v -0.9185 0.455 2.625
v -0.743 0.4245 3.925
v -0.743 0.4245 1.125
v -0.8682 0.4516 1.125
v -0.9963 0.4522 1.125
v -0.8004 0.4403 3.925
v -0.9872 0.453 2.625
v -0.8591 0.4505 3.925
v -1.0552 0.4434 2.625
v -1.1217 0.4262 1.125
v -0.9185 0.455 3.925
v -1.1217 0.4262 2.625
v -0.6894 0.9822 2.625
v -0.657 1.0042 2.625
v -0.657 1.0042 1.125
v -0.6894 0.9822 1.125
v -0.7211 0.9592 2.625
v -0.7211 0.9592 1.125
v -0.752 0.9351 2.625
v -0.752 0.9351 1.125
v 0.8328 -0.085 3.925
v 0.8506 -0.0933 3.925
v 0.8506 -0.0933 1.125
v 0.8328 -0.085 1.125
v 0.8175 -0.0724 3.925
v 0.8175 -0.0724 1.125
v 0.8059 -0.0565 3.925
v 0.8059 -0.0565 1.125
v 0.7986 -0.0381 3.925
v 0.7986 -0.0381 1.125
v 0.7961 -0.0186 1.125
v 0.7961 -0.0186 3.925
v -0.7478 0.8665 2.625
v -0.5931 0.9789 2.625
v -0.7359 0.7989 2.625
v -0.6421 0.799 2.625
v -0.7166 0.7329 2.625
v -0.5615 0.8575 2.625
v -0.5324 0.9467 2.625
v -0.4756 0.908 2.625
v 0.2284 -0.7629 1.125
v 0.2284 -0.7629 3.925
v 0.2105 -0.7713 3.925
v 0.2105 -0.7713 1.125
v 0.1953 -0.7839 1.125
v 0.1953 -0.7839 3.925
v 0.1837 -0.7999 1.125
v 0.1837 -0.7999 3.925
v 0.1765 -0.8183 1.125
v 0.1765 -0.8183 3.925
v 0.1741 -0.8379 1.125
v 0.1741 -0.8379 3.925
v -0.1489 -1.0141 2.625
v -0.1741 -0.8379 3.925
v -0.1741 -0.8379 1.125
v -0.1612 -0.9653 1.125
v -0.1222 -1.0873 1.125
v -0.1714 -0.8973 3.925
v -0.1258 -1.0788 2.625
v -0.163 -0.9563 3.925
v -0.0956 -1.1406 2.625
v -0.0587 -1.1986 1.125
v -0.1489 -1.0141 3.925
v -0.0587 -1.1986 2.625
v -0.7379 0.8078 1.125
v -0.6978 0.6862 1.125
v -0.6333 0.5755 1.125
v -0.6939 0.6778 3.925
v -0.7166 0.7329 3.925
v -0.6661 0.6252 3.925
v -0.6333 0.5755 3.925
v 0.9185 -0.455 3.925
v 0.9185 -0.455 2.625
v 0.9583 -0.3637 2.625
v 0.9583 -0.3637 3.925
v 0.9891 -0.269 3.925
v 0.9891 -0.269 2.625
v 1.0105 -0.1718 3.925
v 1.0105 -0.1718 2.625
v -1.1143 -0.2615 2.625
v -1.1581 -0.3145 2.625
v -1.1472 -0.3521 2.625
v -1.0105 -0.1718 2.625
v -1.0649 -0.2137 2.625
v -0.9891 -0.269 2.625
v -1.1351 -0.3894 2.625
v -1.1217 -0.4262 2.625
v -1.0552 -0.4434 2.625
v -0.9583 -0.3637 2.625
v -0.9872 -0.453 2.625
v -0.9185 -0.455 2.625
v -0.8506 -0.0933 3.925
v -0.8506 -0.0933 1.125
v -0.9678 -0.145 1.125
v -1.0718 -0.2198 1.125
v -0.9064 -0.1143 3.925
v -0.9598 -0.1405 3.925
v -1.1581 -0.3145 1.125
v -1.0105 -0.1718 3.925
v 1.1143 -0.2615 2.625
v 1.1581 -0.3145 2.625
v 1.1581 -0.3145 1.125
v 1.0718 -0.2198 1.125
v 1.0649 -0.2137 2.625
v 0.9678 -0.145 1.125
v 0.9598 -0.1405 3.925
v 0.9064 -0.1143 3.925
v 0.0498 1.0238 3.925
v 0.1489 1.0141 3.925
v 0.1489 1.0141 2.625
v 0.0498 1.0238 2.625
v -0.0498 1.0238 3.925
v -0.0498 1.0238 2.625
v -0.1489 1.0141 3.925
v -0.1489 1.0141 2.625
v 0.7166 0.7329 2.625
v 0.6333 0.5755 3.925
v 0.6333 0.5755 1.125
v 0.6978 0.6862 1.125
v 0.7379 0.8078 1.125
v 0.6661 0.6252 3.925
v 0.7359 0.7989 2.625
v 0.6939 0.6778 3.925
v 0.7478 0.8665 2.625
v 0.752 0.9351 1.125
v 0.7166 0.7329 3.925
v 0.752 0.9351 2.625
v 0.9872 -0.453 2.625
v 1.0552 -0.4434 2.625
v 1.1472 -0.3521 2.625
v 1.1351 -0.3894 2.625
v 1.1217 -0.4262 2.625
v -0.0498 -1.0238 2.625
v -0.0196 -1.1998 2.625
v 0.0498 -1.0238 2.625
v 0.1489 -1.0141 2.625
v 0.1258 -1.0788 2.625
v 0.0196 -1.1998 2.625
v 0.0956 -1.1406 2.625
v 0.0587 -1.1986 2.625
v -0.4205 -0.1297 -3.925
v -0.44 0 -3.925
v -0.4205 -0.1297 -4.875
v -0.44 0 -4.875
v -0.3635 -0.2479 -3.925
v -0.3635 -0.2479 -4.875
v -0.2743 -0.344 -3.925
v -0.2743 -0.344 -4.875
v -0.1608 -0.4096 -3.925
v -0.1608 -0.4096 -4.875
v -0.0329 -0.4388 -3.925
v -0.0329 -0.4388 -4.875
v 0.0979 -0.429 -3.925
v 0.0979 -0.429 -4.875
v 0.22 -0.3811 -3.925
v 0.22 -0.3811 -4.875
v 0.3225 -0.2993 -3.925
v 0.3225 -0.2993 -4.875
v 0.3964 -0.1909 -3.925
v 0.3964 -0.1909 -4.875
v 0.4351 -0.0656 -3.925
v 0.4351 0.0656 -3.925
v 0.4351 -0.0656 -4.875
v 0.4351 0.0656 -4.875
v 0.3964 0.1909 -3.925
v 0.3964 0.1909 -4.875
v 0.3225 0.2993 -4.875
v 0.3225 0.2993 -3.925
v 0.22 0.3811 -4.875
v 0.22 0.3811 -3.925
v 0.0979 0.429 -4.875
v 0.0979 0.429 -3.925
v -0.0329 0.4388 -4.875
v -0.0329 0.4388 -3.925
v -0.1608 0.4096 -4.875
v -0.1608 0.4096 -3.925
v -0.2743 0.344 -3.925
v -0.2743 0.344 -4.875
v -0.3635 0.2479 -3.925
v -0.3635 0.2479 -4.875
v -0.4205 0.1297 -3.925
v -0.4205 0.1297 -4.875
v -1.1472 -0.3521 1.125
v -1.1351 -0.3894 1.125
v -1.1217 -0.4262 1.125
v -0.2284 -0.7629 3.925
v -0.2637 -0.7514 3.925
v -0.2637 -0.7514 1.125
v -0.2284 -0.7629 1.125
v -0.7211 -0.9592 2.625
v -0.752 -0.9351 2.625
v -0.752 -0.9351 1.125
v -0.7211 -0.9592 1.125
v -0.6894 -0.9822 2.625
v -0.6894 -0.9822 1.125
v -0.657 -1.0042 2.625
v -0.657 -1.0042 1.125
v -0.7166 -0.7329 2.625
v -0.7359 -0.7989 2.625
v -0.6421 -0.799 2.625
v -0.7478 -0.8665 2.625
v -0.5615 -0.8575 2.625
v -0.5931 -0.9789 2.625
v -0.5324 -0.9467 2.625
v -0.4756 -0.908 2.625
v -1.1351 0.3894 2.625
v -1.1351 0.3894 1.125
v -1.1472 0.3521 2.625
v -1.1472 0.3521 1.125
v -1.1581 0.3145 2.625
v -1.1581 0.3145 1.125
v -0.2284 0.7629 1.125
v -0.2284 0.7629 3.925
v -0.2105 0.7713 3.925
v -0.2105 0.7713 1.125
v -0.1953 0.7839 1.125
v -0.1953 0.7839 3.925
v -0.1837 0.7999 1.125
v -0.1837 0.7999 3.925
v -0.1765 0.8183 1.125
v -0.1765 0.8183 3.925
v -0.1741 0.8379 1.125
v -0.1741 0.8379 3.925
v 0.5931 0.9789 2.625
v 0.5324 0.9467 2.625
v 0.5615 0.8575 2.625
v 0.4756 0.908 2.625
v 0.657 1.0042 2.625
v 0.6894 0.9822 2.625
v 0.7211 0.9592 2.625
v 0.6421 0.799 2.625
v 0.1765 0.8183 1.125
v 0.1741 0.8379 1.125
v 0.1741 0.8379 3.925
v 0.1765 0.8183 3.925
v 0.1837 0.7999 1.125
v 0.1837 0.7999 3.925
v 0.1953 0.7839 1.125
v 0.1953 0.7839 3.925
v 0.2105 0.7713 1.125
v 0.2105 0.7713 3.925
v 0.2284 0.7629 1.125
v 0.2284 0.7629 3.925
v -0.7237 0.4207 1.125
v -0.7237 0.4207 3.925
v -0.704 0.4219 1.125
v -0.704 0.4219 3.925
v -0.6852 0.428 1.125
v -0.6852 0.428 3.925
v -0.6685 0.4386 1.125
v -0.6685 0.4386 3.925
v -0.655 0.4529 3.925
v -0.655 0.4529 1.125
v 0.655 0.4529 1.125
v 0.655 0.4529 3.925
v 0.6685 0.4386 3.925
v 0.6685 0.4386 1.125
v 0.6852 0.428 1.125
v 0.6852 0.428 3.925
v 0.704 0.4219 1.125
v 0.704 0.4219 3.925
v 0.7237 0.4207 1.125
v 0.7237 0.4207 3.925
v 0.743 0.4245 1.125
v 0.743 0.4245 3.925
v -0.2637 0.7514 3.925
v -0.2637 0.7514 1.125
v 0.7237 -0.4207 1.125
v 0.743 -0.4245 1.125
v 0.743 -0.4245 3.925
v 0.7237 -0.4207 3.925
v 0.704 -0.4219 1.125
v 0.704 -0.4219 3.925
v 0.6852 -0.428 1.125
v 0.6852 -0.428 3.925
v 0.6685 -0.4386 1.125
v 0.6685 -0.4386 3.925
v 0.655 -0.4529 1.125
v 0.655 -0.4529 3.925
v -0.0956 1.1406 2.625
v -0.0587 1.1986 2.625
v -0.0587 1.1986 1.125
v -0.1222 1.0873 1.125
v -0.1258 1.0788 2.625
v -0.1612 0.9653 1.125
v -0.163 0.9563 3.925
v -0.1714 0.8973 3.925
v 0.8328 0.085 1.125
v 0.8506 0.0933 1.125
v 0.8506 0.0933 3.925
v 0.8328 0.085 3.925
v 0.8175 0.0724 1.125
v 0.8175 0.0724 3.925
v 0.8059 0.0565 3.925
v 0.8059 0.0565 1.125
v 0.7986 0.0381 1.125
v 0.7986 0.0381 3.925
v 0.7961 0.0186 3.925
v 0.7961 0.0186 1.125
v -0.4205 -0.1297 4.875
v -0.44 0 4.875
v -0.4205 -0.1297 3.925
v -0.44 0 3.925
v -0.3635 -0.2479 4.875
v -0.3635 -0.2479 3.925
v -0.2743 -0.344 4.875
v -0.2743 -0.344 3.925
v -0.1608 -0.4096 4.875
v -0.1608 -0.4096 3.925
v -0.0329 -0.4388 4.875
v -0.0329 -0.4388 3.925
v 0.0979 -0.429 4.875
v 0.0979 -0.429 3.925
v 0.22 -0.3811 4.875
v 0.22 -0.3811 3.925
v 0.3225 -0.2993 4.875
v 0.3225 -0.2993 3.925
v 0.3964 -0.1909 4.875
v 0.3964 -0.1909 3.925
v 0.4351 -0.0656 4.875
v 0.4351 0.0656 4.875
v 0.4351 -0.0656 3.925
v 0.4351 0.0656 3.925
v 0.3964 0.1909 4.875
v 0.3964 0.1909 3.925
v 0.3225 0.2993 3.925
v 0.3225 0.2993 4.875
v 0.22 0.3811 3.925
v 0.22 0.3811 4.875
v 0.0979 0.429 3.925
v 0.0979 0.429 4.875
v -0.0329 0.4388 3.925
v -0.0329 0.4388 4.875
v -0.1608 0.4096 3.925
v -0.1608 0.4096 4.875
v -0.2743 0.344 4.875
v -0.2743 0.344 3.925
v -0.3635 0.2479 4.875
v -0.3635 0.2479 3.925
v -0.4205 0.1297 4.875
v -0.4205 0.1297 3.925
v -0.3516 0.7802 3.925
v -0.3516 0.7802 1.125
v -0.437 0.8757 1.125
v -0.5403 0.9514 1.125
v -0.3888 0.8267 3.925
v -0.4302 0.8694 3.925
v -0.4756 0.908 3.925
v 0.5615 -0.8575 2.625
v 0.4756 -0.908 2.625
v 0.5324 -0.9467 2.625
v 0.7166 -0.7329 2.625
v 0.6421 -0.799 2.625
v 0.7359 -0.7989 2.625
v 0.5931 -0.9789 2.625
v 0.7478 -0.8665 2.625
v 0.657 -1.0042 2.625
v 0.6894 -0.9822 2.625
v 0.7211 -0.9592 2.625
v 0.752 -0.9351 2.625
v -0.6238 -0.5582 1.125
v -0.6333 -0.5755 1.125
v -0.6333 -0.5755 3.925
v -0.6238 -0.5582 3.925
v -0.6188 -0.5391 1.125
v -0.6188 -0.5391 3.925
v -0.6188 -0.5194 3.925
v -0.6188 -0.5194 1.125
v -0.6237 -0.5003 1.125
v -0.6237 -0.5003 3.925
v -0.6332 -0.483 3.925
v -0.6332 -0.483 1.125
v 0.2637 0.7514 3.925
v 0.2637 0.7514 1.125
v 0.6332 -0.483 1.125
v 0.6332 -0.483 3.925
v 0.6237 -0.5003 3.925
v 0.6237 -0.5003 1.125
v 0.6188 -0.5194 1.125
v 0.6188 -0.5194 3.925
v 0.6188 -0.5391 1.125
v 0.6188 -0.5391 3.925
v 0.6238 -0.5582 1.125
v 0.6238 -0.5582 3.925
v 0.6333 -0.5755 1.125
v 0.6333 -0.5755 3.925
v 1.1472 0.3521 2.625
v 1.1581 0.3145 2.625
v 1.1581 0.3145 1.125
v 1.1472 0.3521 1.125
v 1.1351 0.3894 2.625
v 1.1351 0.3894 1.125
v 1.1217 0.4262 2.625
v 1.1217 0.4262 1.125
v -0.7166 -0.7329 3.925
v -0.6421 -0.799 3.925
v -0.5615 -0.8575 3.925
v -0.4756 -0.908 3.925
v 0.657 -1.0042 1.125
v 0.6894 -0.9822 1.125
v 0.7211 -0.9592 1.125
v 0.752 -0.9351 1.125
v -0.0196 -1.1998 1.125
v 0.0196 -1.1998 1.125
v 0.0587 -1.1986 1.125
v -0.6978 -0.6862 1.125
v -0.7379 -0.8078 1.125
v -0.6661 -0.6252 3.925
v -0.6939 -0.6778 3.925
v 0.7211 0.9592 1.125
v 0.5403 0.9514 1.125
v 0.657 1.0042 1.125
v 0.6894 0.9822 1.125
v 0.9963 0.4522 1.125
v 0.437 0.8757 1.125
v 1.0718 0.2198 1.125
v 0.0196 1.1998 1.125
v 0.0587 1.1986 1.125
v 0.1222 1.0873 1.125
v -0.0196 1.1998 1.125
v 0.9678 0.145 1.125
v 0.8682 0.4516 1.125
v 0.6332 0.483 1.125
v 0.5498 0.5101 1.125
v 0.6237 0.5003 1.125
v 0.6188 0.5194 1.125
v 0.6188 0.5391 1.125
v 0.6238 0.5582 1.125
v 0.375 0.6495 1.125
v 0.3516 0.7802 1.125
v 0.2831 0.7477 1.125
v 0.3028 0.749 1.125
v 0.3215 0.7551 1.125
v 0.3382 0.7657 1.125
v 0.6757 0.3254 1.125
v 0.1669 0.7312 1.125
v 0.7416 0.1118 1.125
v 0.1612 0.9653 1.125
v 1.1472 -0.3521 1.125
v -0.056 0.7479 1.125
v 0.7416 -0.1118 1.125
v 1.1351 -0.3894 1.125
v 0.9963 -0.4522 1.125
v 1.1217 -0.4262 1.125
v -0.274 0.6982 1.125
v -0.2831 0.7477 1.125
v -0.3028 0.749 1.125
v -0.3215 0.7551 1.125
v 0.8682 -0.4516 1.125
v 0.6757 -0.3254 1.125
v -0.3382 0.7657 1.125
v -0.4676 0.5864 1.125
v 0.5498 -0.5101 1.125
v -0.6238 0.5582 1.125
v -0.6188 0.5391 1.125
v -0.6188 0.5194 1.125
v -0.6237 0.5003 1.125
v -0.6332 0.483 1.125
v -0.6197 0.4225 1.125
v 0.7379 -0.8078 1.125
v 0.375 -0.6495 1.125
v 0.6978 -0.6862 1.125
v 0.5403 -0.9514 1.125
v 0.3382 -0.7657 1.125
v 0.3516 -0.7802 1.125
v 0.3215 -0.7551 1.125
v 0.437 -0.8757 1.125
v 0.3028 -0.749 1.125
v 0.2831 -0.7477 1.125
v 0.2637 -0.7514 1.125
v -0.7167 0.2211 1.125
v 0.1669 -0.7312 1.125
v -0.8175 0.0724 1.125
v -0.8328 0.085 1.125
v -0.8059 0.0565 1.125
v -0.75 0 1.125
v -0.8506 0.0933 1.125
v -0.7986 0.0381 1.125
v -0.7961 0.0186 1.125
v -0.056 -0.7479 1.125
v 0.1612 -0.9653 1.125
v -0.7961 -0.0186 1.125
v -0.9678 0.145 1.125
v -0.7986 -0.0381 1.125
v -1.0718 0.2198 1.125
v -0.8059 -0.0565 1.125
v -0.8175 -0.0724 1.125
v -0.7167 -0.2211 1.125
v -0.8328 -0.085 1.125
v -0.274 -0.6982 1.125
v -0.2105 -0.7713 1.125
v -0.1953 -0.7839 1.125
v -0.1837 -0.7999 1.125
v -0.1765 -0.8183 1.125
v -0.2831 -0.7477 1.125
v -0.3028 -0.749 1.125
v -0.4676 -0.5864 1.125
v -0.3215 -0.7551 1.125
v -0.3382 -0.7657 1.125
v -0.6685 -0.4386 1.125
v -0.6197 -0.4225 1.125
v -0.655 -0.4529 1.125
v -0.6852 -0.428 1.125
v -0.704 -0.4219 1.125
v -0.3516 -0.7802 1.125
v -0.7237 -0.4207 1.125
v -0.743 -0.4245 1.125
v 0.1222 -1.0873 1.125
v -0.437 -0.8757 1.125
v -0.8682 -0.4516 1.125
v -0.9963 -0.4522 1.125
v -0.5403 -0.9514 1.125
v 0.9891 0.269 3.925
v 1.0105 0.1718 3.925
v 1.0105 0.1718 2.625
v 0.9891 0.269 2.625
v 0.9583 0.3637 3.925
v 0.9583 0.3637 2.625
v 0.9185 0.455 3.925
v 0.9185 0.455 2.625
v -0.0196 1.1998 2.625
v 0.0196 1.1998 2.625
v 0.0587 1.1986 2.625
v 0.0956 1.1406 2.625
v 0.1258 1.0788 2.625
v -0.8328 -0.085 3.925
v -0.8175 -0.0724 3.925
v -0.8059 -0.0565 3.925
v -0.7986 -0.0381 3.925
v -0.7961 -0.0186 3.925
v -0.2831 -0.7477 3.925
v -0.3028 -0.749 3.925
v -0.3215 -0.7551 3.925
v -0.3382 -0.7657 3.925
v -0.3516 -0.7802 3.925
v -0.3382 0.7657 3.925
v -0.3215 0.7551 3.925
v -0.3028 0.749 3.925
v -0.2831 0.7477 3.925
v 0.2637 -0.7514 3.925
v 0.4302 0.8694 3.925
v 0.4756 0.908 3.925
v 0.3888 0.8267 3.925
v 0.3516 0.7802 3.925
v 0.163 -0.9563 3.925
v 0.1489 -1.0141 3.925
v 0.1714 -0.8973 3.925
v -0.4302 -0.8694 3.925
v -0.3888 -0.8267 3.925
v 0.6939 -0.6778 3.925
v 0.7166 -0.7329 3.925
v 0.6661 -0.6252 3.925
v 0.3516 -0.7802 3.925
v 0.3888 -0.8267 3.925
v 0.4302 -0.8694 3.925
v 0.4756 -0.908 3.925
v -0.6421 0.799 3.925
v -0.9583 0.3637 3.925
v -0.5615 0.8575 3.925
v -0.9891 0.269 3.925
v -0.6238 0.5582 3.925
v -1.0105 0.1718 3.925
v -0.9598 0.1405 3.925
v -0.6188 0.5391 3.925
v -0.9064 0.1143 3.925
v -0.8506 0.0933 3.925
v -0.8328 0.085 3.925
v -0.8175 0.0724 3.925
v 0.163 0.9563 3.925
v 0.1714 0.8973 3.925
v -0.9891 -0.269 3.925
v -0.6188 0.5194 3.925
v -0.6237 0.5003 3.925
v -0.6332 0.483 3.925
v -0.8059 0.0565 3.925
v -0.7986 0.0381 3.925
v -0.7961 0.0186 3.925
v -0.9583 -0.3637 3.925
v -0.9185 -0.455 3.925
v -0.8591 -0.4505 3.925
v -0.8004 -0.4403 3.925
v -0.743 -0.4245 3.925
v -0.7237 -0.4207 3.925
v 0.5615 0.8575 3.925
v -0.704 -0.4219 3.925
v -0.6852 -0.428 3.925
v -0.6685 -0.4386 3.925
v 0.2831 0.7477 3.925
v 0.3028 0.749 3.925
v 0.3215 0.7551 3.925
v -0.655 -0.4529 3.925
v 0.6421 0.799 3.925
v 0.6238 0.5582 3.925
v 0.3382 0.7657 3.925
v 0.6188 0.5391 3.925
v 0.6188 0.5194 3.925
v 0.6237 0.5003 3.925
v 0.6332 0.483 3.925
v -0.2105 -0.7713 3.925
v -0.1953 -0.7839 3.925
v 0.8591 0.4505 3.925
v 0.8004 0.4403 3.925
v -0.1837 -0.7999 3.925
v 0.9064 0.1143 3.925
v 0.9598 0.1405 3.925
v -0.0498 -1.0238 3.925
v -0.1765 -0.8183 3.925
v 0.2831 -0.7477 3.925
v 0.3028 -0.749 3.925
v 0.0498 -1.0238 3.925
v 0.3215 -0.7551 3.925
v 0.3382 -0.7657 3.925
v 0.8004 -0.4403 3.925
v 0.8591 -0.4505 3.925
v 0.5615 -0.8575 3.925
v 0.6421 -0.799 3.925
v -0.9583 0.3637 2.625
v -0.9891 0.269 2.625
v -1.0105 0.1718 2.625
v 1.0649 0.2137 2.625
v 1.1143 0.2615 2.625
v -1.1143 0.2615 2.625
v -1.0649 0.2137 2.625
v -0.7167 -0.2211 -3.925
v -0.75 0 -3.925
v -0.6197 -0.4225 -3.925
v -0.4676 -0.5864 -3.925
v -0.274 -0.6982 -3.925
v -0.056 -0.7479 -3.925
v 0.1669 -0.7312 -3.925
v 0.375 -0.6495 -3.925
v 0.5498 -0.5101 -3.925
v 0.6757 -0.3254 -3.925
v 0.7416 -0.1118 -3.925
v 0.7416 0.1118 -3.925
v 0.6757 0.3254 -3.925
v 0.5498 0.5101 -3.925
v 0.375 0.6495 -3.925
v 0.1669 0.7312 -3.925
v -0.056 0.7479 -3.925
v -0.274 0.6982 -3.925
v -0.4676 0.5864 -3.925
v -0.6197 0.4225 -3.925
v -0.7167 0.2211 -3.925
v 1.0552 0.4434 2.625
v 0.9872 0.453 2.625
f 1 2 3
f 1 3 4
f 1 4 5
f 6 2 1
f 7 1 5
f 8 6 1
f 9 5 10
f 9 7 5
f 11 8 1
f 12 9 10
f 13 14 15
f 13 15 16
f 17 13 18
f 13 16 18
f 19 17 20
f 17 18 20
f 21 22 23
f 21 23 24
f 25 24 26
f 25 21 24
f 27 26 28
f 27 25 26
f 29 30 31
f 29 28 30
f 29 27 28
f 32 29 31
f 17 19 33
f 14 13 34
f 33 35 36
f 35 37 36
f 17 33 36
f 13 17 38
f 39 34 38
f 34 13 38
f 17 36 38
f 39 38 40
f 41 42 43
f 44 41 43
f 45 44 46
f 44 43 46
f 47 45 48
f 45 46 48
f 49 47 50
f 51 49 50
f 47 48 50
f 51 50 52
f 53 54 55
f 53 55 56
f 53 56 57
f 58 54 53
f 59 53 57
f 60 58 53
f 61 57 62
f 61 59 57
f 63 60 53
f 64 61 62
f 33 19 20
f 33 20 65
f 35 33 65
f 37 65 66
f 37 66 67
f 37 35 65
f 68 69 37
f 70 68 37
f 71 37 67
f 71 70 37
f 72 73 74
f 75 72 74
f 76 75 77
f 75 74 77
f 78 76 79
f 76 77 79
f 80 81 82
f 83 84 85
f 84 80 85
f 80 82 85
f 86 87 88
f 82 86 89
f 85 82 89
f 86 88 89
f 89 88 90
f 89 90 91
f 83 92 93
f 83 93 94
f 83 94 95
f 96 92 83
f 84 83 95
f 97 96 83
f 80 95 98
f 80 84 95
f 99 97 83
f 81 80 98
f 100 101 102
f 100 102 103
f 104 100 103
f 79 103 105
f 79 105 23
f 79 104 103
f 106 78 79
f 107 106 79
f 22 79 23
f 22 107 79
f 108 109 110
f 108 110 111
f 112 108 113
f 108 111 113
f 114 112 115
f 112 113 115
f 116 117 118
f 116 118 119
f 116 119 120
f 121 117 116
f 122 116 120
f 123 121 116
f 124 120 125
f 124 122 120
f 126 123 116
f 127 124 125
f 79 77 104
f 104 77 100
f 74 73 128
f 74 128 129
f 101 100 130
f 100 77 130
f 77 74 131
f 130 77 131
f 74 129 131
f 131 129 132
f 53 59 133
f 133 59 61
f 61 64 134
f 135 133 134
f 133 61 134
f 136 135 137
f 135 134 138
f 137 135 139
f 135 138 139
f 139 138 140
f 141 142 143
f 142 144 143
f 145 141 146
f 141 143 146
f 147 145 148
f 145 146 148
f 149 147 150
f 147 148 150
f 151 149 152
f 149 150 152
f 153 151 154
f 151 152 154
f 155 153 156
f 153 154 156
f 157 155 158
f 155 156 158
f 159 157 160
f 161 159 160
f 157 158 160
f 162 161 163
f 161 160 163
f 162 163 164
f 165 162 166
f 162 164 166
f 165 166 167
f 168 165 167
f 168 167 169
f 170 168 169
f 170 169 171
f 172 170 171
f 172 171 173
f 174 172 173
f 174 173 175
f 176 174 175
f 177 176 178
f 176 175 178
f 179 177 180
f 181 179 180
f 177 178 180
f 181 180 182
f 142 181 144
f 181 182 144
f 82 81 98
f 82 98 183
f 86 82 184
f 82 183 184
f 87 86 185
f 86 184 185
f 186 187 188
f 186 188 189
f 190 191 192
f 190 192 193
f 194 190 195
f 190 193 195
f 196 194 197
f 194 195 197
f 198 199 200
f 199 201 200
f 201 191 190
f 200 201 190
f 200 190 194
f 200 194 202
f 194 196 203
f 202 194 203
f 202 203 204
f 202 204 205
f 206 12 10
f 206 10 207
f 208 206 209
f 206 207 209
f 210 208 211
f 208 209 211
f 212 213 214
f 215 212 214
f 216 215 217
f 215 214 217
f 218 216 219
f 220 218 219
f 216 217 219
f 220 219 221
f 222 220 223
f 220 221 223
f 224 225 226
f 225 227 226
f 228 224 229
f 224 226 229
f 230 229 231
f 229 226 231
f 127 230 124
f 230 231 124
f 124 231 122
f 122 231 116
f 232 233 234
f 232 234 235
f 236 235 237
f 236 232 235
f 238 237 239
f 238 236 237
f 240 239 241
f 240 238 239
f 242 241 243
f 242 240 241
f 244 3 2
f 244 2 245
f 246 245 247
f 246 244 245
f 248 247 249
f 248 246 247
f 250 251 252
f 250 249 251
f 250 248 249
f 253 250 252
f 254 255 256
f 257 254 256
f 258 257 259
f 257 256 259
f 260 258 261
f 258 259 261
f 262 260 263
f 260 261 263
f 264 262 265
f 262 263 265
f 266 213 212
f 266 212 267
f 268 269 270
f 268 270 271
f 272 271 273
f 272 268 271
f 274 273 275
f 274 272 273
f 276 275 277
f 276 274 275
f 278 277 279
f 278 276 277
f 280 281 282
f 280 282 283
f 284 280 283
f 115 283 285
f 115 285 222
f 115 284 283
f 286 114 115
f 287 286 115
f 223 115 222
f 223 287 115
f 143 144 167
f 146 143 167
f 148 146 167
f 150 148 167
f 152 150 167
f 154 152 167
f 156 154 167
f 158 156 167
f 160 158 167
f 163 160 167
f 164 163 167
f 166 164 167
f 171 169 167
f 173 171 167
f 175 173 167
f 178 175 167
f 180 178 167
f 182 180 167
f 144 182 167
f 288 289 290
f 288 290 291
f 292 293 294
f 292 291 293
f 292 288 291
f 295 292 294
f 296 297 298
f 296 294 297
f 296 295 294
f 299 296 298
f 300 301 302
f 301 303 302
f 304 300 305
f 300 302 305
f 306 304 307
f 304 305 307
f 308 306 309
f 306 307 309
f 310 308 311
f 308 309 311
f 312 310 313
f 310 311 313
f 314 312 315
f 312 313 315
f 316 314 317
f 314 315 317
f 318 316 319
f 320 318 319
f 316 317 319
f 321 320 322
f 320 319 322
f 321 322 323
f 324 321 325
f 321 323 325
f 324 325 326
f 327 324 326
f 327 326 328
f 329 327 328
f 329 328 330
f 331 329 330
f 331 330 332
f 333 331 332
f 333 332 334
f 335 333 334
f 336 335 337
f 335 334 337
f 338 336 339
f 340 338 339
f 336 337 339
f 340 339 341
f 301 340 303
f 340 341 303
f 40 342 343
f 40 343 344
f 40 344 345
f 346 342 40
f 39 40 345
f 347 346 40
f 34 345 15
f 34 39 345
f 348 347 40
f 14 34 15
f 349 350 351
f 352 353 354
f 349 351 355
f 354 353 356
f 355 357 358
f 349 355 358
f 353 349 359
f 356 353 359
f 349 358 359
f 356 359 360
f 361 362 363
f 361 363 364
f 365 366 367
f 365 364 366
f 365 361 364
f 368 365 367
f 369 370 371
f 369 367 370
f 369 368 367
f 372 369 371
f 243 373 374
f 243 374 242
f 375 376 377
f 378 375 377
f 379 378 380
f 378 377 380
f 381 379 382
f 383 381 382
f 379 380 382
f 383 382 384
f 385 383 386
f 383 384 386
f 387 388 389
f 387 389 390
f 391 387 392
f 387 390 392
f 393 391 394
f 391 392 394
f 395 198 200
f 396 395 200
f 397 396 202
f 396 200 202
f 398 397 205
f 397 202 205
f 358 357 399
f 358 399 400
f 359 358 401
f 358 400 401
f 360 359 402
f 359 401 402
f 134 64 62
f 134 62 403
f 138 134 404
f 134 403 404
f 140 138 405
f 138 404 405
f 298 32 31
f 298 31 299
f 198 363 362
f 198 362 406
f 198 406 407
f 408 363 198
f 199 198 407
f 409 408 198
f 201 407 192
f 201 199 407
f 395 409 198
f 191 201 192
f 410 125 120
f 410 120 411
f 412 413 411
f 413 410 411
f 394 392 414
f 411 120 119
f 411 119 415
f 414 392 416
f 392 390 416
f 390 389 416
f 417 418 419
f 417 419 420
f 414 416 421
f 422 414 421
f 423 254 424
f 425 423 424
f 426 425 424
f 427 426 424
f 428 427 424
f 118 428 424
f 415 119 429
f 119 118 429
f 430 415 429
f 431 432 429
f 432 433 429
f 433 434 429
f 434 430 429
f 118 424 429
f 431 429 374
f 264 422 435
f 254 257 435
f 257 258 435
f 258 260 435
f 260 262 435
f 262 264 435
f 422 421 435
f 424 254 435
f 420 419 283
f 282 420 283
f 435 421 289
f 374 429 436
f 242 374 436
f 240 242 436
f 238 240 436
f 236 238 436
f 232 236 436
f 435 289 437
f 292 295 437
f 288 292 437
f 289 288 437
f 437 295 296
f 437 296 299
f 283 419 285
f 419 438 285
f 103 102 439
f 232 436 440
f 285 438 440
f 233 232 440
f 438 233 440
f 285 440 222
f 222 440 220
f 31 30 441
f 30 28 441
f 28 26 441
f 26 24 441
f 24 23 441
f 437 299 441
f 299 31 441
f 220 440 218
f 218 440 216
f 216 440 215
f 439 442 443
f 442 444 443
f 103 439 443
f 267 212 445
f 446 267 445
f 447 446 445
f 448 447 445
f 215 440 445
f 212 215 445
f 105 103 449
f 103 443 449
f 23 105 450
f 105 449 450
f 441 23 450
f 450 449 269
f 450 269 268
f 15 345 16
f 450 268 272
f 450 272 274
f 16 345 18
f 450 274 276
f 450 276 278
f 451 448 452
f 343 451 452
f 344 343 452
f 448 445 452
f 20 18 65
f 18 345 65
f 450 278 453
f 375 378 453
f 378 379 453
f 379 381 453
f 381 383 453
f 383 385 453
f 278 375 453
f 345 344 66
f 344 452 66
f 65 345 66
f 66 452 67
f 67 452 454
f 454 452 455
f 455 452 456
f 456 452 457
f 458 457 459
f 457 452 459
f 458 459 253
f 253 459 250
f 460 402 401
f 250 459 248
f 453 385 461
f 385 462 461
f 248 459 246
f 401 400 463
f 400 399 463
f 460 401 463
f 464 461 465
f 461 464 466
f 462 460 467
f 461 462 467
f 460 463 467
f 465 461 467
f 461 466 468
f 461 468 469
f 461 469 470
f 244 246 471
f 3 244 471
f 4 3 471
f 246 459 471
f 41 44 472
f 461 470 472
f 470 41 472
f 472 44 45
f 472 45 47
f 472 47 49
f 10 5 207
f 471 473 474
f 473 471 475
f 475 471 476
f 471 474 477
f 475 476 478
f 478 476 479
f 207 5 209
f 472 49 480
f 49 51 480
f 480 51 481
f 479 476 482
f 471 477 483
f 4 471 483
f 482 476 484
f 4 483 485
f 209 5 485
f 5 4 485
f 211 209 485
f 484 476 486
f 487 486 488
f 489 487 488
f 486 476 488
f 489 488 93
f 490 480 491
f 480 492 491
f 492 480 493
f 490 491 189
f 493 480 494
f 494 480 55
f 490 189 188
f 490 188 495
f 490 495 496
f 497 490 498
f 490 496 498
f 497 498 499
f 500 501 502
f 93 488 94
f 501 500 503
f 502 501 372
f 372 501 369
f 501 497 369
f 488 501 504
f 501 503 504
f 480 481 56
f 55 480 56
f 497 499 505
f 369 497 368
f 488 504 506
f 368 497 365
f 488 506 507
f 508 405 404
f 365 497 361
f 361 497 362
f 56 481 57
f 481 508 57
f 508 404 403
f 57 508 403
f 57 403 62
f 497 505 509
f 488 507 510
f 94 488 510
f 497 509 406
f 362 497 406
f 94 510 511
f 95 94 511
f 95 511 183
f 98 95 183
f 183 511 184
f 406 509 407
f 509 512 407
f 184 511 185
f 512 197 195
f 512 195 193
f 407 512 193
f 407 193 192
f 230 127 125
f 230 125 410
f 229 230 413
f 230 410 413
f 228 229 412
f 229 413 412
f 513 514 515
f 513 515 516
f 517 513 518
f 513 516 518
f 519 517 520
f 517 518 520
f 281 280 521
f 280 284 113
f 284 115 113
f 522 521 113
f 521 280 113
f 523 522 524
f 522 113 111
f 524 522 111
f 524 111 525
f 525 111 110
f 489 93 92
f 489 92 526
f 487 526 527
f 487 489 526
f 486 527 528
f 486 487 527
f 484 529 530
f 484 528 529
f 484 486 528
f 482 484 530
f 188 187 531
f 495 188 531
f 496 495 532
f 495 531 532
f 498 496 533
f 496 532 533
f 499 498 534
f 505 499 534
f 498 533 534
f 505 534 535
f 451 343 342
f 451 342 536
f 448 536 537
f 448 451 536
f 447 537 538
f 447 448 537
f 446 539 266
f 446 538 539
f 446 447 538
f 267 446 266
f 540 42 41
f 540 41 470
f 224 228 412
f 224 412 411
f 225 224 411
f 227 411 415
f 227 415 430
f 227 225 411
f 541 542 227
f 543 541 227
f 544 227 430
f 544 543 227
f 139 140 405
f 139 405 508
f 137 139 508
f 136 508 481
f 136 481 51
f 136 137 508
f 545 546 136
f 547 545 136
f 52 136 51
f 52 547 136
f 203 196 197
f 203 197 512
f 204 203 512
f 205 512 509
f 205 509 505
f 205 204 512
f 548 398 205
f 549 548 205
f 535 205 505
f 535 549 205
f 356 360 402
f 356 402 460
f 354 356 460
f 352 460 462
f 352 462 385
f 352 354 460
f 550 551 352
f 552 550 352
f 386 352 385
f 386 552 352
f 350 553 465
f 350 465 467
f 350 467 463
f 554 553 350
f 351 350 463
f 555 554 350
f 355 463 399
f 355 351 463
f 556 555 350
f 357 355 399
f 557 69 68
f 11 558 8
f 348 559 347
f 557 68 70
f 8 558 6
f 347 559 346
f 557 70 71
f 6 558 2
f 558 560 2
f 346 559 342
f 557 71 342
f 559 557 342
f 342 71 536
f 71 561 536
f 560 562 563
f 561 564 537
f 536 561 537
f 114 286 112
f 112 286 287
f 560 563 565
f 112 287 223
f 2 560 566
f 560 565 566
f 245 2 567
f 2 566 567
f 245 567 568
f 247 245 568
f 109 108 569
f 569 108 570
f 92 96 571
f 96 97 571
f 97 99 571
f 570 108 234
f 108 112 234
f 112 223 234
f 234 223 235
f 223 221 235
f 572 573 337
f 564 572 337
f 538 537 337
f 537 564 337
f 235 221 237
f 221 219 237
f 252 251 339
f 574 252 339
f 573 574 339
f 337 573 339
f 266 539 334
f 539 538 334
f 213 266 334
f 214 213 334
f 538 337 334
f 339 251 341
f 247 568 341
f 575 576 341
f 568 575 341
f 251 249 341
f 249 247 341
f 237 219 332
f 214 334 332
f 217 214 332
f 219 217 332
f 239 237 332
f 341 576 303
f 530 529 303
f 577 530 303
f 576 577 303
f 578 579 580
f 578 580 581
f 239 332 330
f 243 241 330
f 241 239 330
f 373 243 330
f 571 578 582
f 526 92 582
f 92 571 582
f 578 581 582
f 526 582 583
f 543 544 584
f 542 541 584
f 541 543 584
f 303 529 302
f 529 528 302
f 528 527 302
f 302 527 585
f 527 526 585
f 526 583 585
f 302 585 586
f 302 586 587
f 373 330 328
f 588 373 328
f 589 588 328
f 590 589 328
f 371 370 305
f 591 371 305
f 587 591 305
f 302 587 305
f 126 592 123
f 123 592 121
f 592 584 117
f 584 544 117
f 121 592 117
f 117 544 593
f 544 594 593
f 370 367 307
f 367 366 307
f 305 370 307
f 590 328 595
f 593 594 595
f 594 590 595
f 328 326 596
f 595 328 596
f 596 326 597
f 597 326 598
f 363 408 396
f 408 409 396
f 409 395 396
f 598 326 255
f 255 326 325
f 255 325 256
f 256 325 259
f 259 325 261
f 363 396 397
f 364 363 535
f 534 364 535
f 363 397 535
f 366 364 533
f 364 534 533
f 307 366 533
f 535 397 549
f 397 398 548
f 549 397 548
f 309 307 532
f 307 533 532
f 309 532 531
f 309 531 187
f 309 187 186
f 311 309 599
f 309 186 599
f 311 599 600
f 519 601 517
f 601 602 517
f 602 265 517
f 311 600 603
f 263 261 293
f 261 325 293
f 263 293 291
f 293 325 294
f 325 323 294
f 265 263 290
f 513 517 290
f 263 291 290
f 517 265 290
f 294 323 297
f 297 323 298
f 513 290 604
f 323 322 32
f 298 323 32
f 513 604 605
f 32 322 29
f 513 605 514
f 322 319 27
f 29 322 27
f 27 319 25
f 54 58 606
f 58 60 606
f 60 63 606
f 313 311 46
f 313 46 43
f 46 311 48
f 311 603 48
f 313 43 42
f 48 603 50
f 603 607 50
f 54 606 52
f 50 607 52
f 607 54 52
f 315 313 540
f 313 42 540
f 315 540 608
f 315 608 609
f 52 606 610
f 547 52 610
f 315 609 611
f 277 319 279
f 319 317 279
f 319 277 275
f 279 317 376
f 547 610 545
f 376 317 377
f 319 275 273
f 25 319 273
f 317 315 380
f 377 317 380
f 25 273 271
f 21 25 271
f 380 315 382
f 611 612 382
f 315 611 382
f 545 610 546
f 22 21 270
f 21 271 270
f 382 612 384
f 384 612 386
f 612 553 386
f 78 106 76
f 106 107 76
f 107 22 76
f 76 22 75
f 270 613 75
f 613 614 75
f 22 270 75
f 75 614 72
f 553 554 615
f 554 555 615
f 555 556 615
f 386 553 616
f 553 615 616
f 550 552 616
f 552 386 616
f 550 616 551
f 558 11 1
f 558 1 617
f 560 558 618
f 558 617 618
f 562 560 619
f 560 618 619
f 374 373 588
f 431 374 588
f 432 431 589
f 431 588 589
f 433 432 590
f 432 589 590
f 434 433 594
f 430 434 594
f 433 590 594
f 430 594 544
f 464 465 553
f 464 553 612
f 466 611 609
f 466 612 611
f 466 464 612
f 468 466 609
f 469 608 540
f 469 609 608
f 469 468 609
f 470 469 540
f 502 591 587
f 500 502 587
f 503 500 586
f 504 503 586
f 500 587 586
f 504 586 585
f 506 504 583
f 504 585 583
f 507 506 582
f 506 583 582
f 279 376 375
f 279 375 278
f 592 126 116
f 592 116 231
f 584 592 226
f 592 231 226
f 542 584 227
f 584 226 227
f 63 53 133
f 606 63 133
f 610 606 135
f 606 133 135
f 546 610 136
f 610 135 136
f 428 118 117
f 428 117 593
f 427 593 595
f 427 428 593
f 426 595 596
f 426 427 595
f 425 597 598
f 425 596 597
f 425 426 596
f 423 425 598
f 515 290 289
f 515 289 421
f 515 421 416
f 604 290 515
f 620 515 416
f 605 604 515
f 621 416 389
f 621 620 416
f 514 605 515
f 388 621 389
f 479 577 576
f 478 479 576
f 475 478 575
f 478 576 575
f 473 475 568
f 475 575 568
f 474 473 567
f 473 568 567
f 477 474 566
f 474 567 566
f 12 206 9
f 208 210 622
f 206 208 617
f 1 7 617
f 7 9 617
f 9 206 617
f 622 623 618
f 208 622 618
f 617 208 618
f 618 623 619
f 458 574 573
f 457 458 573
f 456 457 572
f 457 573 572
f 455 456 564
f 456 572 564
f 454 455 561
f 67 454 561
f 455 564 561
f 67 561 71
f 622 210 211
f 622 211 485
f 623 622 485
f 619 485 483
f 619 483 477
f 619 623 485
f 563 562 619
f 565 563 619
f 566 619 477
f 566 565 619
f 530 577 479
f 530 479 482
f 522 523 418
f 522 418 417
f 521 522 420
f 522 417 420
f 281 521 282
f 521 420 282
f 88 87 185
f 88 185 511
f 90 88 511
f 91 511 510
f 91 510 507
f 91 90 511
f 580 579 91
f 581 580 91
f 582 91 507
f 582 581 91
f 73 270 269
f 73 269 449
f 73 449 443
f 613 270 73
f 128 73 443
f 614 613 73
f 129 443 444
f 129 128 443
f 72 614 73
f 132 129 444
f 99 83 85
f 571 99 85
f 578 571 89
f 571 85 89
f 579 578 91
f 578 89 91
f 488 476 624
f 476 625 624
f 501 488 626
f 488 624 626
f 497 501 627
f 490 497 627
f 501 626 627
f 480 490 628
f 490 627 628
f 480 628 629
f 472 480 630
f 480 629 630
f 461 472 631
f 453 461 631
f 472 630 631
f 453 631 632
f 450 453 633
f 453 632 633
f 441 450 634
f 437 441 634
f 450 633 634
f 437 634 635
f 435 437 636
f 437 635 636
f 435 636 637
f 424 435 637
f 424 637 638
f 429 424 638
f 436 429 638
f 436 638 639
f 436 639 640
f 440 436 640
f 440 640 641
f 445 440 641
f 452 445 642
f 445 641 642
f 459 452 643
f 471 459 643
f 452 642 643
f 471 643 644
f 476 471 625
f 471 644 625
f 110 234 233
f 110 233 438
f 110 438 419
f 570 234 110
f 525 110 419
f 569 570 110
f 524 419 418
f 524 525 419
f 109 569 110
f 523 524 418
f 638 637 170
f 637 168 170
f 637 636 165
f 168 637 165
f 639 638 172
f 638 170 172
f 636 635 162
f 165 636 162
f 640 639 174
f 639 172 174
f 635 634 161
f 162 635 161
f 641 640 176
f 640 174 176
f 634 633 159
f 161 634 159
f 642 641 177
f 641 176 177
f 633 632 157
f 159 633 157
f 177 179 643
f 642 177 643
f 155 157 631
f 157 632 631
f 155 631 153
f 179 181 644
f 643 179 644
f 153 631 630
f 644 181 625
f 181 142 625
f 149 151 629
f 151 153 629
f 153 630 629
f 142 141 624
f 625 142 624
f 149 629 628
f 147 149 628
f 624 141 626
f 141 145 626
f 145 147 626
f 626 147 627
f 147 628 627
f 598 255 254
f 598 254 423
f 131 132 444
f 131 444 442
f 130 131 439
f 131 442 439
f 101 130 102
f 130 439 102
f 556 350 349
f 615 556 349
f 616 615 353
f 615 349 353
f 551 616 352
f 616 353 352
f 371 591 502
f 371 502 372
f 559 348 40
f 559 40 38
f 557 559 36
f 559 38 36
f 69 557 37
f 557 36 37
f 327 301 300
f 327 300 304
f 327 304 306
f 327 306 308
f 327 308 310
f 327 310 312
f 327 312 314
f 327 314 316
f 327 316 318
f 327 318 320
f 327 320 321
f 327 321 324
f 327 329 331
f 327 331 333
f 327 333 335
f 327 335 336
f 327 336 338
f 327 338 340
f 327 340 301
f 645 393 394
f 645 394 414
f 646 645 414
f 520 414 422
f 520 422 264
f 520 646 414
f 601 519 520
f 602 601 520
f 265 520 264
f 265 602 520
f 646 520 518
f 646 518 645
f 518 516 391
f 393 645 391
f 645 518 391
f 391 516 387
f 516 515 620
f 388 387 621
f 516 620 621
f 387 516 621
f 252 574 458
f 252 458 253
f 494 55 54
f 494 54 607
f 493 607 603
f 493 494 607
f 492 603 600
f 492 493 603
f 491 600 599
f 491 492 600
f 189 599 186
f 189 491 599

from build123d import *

# Parameters (mm, degrees)
BOSS_EXTRUDE1_DEPTH      = 4.875
BOSS_EXTRUDE1_DEPTH_BACK = 4.875
SKETCH3_R                = 1.2
CUT_EXTRUDE1_DEPTH       = 6.161940042
FILLET1_R                = 0.078539816
CIRPATTERN1_COUNT        = 10
FILLET1_OF_CIRPATTERN1_R = 0.078539816


with BuildPart() as part:
    # Sketch3 → Boss-Extrude1 (new, two sides: drawn at the far end of the back side and taken through both)
    with BuildSketch(Plane.XY.offset(-BOSS_EXTRUDE1_DEPTH_BACK)):
        Circle(SKETCH3_R)
    extrude(amount=BOSS_EXTRUDE1_DEPTH + BOSS_EXTRUDE1_DEPTH_BACK)

    # Sketch4 → Cut-Extrude1 (cut, symmetric)
    with BuildSketch(Plane.XY):
        with BuildLine():
            Line((0.796135351, -0.078539816), (0.796135351, 0.078539816))
            ThreePointArc((0.796135351, 0.078539816), (0.998479062, 0.163721965), (1.158053404, 0.314503282))
            ThreePointArc((1.158053404, 0.314503282), (1.2, 0), (1.158053404, -0.314503282))
            ThreePointArc((1.158053404, -0.314503282), (0.998479062, -0.163721965), (0.796135351, -0.078539816))
        make_face()
    cut_extrude1 = extrude(amount=CUT_EXTRUDE1_DEPTH, both=True, mode=Mode.SUBTRACT)

    # Fillet1
    fillet1_edges = [part.edges().sort_by_distance(p)[0] for p in [
        (0.796135351, 0.078539816, 0),
        (0.796135351, -0.078539816, 0),
    ]]
    fillet(fillet1_edges, radius=FILLET1_R)

    # CirPattern1: Cut-Extrude1 ×10 about axis
    cirpattern1_axis = Axis((0, 0, 0), (0, 0, 1))
    for i in range(1, CIRPATTERN1_COUNT):
        add(cut_extrude1.rotate(cirpattern1_axis, i * 360 / CIRPATTERN1_COUNT), mode=Mode.SUBTRACT)

    # Fillet1 of CirPattern1
    fillet1_of_cirpattern1_edges = [part.edges().sort_by_distance(p)[0] for p in [
        (0.597922483, 0.531496664, 0),
        (0.690251575, 0.404416572, 0),
        (0.171323549, 0.781439851, 0),
        (0.320715157, 0.732899576, 0),
        (-0.320715157, 0.732899576, 0),
        (-0.171323549, 0.781439851, 0),
        (-0.690251575, 0.404416572, 0),
        (-0.597922483, 0.531496664, 0),
        (-0.796135351, -0.078539816, 0),
        (-0.796135351, 0.078539816, 0),
        (-0.597922483, -0.531496664, 0),
        (-0.690251575, -0.404416572, 0),
        (-0.171323549, -0.781439851, 0),
        (-0.320715157, -0.732899576, 0),
        (0.320715157, -0.732899576, 0),
        (0.171323549, -0.781439851, 0),
        (0.690251575, -0.404416572, 0),
        (0.597922483, -0.531496664, 0),
    ]]
    fillet(fillet1_of_cirpattern1_edges, radius=FILLET1_OF_CIRPATTERN1_R)

    # Sketch6 → Cut-Revolve1 (revolve, cut)
    with BuildSketch(Plane(origin=(0, 0, 0), x_dir=(1, 0, 0), z_dir=(0, 1, 0))):
        Polygon((-0.44, 4.875), (-1.3, 4.875), (-1.3, -1.125), (-0.75, -1.125), (-0.75, 3.925), (-0.44, 3.925), align=None)
        Polygon((-1.3, -2.625), (-1.3, -4.875), (-0.44, -4.875), (-0.44, -3.925), (-1.025, -3.925), (-1.025, -2.625), align=None)
    revolve(axis=Axis((0, 0, -6.2826103), (0, 0, 1)), mode=Mode.SUBTRACT)


solid = part.part
